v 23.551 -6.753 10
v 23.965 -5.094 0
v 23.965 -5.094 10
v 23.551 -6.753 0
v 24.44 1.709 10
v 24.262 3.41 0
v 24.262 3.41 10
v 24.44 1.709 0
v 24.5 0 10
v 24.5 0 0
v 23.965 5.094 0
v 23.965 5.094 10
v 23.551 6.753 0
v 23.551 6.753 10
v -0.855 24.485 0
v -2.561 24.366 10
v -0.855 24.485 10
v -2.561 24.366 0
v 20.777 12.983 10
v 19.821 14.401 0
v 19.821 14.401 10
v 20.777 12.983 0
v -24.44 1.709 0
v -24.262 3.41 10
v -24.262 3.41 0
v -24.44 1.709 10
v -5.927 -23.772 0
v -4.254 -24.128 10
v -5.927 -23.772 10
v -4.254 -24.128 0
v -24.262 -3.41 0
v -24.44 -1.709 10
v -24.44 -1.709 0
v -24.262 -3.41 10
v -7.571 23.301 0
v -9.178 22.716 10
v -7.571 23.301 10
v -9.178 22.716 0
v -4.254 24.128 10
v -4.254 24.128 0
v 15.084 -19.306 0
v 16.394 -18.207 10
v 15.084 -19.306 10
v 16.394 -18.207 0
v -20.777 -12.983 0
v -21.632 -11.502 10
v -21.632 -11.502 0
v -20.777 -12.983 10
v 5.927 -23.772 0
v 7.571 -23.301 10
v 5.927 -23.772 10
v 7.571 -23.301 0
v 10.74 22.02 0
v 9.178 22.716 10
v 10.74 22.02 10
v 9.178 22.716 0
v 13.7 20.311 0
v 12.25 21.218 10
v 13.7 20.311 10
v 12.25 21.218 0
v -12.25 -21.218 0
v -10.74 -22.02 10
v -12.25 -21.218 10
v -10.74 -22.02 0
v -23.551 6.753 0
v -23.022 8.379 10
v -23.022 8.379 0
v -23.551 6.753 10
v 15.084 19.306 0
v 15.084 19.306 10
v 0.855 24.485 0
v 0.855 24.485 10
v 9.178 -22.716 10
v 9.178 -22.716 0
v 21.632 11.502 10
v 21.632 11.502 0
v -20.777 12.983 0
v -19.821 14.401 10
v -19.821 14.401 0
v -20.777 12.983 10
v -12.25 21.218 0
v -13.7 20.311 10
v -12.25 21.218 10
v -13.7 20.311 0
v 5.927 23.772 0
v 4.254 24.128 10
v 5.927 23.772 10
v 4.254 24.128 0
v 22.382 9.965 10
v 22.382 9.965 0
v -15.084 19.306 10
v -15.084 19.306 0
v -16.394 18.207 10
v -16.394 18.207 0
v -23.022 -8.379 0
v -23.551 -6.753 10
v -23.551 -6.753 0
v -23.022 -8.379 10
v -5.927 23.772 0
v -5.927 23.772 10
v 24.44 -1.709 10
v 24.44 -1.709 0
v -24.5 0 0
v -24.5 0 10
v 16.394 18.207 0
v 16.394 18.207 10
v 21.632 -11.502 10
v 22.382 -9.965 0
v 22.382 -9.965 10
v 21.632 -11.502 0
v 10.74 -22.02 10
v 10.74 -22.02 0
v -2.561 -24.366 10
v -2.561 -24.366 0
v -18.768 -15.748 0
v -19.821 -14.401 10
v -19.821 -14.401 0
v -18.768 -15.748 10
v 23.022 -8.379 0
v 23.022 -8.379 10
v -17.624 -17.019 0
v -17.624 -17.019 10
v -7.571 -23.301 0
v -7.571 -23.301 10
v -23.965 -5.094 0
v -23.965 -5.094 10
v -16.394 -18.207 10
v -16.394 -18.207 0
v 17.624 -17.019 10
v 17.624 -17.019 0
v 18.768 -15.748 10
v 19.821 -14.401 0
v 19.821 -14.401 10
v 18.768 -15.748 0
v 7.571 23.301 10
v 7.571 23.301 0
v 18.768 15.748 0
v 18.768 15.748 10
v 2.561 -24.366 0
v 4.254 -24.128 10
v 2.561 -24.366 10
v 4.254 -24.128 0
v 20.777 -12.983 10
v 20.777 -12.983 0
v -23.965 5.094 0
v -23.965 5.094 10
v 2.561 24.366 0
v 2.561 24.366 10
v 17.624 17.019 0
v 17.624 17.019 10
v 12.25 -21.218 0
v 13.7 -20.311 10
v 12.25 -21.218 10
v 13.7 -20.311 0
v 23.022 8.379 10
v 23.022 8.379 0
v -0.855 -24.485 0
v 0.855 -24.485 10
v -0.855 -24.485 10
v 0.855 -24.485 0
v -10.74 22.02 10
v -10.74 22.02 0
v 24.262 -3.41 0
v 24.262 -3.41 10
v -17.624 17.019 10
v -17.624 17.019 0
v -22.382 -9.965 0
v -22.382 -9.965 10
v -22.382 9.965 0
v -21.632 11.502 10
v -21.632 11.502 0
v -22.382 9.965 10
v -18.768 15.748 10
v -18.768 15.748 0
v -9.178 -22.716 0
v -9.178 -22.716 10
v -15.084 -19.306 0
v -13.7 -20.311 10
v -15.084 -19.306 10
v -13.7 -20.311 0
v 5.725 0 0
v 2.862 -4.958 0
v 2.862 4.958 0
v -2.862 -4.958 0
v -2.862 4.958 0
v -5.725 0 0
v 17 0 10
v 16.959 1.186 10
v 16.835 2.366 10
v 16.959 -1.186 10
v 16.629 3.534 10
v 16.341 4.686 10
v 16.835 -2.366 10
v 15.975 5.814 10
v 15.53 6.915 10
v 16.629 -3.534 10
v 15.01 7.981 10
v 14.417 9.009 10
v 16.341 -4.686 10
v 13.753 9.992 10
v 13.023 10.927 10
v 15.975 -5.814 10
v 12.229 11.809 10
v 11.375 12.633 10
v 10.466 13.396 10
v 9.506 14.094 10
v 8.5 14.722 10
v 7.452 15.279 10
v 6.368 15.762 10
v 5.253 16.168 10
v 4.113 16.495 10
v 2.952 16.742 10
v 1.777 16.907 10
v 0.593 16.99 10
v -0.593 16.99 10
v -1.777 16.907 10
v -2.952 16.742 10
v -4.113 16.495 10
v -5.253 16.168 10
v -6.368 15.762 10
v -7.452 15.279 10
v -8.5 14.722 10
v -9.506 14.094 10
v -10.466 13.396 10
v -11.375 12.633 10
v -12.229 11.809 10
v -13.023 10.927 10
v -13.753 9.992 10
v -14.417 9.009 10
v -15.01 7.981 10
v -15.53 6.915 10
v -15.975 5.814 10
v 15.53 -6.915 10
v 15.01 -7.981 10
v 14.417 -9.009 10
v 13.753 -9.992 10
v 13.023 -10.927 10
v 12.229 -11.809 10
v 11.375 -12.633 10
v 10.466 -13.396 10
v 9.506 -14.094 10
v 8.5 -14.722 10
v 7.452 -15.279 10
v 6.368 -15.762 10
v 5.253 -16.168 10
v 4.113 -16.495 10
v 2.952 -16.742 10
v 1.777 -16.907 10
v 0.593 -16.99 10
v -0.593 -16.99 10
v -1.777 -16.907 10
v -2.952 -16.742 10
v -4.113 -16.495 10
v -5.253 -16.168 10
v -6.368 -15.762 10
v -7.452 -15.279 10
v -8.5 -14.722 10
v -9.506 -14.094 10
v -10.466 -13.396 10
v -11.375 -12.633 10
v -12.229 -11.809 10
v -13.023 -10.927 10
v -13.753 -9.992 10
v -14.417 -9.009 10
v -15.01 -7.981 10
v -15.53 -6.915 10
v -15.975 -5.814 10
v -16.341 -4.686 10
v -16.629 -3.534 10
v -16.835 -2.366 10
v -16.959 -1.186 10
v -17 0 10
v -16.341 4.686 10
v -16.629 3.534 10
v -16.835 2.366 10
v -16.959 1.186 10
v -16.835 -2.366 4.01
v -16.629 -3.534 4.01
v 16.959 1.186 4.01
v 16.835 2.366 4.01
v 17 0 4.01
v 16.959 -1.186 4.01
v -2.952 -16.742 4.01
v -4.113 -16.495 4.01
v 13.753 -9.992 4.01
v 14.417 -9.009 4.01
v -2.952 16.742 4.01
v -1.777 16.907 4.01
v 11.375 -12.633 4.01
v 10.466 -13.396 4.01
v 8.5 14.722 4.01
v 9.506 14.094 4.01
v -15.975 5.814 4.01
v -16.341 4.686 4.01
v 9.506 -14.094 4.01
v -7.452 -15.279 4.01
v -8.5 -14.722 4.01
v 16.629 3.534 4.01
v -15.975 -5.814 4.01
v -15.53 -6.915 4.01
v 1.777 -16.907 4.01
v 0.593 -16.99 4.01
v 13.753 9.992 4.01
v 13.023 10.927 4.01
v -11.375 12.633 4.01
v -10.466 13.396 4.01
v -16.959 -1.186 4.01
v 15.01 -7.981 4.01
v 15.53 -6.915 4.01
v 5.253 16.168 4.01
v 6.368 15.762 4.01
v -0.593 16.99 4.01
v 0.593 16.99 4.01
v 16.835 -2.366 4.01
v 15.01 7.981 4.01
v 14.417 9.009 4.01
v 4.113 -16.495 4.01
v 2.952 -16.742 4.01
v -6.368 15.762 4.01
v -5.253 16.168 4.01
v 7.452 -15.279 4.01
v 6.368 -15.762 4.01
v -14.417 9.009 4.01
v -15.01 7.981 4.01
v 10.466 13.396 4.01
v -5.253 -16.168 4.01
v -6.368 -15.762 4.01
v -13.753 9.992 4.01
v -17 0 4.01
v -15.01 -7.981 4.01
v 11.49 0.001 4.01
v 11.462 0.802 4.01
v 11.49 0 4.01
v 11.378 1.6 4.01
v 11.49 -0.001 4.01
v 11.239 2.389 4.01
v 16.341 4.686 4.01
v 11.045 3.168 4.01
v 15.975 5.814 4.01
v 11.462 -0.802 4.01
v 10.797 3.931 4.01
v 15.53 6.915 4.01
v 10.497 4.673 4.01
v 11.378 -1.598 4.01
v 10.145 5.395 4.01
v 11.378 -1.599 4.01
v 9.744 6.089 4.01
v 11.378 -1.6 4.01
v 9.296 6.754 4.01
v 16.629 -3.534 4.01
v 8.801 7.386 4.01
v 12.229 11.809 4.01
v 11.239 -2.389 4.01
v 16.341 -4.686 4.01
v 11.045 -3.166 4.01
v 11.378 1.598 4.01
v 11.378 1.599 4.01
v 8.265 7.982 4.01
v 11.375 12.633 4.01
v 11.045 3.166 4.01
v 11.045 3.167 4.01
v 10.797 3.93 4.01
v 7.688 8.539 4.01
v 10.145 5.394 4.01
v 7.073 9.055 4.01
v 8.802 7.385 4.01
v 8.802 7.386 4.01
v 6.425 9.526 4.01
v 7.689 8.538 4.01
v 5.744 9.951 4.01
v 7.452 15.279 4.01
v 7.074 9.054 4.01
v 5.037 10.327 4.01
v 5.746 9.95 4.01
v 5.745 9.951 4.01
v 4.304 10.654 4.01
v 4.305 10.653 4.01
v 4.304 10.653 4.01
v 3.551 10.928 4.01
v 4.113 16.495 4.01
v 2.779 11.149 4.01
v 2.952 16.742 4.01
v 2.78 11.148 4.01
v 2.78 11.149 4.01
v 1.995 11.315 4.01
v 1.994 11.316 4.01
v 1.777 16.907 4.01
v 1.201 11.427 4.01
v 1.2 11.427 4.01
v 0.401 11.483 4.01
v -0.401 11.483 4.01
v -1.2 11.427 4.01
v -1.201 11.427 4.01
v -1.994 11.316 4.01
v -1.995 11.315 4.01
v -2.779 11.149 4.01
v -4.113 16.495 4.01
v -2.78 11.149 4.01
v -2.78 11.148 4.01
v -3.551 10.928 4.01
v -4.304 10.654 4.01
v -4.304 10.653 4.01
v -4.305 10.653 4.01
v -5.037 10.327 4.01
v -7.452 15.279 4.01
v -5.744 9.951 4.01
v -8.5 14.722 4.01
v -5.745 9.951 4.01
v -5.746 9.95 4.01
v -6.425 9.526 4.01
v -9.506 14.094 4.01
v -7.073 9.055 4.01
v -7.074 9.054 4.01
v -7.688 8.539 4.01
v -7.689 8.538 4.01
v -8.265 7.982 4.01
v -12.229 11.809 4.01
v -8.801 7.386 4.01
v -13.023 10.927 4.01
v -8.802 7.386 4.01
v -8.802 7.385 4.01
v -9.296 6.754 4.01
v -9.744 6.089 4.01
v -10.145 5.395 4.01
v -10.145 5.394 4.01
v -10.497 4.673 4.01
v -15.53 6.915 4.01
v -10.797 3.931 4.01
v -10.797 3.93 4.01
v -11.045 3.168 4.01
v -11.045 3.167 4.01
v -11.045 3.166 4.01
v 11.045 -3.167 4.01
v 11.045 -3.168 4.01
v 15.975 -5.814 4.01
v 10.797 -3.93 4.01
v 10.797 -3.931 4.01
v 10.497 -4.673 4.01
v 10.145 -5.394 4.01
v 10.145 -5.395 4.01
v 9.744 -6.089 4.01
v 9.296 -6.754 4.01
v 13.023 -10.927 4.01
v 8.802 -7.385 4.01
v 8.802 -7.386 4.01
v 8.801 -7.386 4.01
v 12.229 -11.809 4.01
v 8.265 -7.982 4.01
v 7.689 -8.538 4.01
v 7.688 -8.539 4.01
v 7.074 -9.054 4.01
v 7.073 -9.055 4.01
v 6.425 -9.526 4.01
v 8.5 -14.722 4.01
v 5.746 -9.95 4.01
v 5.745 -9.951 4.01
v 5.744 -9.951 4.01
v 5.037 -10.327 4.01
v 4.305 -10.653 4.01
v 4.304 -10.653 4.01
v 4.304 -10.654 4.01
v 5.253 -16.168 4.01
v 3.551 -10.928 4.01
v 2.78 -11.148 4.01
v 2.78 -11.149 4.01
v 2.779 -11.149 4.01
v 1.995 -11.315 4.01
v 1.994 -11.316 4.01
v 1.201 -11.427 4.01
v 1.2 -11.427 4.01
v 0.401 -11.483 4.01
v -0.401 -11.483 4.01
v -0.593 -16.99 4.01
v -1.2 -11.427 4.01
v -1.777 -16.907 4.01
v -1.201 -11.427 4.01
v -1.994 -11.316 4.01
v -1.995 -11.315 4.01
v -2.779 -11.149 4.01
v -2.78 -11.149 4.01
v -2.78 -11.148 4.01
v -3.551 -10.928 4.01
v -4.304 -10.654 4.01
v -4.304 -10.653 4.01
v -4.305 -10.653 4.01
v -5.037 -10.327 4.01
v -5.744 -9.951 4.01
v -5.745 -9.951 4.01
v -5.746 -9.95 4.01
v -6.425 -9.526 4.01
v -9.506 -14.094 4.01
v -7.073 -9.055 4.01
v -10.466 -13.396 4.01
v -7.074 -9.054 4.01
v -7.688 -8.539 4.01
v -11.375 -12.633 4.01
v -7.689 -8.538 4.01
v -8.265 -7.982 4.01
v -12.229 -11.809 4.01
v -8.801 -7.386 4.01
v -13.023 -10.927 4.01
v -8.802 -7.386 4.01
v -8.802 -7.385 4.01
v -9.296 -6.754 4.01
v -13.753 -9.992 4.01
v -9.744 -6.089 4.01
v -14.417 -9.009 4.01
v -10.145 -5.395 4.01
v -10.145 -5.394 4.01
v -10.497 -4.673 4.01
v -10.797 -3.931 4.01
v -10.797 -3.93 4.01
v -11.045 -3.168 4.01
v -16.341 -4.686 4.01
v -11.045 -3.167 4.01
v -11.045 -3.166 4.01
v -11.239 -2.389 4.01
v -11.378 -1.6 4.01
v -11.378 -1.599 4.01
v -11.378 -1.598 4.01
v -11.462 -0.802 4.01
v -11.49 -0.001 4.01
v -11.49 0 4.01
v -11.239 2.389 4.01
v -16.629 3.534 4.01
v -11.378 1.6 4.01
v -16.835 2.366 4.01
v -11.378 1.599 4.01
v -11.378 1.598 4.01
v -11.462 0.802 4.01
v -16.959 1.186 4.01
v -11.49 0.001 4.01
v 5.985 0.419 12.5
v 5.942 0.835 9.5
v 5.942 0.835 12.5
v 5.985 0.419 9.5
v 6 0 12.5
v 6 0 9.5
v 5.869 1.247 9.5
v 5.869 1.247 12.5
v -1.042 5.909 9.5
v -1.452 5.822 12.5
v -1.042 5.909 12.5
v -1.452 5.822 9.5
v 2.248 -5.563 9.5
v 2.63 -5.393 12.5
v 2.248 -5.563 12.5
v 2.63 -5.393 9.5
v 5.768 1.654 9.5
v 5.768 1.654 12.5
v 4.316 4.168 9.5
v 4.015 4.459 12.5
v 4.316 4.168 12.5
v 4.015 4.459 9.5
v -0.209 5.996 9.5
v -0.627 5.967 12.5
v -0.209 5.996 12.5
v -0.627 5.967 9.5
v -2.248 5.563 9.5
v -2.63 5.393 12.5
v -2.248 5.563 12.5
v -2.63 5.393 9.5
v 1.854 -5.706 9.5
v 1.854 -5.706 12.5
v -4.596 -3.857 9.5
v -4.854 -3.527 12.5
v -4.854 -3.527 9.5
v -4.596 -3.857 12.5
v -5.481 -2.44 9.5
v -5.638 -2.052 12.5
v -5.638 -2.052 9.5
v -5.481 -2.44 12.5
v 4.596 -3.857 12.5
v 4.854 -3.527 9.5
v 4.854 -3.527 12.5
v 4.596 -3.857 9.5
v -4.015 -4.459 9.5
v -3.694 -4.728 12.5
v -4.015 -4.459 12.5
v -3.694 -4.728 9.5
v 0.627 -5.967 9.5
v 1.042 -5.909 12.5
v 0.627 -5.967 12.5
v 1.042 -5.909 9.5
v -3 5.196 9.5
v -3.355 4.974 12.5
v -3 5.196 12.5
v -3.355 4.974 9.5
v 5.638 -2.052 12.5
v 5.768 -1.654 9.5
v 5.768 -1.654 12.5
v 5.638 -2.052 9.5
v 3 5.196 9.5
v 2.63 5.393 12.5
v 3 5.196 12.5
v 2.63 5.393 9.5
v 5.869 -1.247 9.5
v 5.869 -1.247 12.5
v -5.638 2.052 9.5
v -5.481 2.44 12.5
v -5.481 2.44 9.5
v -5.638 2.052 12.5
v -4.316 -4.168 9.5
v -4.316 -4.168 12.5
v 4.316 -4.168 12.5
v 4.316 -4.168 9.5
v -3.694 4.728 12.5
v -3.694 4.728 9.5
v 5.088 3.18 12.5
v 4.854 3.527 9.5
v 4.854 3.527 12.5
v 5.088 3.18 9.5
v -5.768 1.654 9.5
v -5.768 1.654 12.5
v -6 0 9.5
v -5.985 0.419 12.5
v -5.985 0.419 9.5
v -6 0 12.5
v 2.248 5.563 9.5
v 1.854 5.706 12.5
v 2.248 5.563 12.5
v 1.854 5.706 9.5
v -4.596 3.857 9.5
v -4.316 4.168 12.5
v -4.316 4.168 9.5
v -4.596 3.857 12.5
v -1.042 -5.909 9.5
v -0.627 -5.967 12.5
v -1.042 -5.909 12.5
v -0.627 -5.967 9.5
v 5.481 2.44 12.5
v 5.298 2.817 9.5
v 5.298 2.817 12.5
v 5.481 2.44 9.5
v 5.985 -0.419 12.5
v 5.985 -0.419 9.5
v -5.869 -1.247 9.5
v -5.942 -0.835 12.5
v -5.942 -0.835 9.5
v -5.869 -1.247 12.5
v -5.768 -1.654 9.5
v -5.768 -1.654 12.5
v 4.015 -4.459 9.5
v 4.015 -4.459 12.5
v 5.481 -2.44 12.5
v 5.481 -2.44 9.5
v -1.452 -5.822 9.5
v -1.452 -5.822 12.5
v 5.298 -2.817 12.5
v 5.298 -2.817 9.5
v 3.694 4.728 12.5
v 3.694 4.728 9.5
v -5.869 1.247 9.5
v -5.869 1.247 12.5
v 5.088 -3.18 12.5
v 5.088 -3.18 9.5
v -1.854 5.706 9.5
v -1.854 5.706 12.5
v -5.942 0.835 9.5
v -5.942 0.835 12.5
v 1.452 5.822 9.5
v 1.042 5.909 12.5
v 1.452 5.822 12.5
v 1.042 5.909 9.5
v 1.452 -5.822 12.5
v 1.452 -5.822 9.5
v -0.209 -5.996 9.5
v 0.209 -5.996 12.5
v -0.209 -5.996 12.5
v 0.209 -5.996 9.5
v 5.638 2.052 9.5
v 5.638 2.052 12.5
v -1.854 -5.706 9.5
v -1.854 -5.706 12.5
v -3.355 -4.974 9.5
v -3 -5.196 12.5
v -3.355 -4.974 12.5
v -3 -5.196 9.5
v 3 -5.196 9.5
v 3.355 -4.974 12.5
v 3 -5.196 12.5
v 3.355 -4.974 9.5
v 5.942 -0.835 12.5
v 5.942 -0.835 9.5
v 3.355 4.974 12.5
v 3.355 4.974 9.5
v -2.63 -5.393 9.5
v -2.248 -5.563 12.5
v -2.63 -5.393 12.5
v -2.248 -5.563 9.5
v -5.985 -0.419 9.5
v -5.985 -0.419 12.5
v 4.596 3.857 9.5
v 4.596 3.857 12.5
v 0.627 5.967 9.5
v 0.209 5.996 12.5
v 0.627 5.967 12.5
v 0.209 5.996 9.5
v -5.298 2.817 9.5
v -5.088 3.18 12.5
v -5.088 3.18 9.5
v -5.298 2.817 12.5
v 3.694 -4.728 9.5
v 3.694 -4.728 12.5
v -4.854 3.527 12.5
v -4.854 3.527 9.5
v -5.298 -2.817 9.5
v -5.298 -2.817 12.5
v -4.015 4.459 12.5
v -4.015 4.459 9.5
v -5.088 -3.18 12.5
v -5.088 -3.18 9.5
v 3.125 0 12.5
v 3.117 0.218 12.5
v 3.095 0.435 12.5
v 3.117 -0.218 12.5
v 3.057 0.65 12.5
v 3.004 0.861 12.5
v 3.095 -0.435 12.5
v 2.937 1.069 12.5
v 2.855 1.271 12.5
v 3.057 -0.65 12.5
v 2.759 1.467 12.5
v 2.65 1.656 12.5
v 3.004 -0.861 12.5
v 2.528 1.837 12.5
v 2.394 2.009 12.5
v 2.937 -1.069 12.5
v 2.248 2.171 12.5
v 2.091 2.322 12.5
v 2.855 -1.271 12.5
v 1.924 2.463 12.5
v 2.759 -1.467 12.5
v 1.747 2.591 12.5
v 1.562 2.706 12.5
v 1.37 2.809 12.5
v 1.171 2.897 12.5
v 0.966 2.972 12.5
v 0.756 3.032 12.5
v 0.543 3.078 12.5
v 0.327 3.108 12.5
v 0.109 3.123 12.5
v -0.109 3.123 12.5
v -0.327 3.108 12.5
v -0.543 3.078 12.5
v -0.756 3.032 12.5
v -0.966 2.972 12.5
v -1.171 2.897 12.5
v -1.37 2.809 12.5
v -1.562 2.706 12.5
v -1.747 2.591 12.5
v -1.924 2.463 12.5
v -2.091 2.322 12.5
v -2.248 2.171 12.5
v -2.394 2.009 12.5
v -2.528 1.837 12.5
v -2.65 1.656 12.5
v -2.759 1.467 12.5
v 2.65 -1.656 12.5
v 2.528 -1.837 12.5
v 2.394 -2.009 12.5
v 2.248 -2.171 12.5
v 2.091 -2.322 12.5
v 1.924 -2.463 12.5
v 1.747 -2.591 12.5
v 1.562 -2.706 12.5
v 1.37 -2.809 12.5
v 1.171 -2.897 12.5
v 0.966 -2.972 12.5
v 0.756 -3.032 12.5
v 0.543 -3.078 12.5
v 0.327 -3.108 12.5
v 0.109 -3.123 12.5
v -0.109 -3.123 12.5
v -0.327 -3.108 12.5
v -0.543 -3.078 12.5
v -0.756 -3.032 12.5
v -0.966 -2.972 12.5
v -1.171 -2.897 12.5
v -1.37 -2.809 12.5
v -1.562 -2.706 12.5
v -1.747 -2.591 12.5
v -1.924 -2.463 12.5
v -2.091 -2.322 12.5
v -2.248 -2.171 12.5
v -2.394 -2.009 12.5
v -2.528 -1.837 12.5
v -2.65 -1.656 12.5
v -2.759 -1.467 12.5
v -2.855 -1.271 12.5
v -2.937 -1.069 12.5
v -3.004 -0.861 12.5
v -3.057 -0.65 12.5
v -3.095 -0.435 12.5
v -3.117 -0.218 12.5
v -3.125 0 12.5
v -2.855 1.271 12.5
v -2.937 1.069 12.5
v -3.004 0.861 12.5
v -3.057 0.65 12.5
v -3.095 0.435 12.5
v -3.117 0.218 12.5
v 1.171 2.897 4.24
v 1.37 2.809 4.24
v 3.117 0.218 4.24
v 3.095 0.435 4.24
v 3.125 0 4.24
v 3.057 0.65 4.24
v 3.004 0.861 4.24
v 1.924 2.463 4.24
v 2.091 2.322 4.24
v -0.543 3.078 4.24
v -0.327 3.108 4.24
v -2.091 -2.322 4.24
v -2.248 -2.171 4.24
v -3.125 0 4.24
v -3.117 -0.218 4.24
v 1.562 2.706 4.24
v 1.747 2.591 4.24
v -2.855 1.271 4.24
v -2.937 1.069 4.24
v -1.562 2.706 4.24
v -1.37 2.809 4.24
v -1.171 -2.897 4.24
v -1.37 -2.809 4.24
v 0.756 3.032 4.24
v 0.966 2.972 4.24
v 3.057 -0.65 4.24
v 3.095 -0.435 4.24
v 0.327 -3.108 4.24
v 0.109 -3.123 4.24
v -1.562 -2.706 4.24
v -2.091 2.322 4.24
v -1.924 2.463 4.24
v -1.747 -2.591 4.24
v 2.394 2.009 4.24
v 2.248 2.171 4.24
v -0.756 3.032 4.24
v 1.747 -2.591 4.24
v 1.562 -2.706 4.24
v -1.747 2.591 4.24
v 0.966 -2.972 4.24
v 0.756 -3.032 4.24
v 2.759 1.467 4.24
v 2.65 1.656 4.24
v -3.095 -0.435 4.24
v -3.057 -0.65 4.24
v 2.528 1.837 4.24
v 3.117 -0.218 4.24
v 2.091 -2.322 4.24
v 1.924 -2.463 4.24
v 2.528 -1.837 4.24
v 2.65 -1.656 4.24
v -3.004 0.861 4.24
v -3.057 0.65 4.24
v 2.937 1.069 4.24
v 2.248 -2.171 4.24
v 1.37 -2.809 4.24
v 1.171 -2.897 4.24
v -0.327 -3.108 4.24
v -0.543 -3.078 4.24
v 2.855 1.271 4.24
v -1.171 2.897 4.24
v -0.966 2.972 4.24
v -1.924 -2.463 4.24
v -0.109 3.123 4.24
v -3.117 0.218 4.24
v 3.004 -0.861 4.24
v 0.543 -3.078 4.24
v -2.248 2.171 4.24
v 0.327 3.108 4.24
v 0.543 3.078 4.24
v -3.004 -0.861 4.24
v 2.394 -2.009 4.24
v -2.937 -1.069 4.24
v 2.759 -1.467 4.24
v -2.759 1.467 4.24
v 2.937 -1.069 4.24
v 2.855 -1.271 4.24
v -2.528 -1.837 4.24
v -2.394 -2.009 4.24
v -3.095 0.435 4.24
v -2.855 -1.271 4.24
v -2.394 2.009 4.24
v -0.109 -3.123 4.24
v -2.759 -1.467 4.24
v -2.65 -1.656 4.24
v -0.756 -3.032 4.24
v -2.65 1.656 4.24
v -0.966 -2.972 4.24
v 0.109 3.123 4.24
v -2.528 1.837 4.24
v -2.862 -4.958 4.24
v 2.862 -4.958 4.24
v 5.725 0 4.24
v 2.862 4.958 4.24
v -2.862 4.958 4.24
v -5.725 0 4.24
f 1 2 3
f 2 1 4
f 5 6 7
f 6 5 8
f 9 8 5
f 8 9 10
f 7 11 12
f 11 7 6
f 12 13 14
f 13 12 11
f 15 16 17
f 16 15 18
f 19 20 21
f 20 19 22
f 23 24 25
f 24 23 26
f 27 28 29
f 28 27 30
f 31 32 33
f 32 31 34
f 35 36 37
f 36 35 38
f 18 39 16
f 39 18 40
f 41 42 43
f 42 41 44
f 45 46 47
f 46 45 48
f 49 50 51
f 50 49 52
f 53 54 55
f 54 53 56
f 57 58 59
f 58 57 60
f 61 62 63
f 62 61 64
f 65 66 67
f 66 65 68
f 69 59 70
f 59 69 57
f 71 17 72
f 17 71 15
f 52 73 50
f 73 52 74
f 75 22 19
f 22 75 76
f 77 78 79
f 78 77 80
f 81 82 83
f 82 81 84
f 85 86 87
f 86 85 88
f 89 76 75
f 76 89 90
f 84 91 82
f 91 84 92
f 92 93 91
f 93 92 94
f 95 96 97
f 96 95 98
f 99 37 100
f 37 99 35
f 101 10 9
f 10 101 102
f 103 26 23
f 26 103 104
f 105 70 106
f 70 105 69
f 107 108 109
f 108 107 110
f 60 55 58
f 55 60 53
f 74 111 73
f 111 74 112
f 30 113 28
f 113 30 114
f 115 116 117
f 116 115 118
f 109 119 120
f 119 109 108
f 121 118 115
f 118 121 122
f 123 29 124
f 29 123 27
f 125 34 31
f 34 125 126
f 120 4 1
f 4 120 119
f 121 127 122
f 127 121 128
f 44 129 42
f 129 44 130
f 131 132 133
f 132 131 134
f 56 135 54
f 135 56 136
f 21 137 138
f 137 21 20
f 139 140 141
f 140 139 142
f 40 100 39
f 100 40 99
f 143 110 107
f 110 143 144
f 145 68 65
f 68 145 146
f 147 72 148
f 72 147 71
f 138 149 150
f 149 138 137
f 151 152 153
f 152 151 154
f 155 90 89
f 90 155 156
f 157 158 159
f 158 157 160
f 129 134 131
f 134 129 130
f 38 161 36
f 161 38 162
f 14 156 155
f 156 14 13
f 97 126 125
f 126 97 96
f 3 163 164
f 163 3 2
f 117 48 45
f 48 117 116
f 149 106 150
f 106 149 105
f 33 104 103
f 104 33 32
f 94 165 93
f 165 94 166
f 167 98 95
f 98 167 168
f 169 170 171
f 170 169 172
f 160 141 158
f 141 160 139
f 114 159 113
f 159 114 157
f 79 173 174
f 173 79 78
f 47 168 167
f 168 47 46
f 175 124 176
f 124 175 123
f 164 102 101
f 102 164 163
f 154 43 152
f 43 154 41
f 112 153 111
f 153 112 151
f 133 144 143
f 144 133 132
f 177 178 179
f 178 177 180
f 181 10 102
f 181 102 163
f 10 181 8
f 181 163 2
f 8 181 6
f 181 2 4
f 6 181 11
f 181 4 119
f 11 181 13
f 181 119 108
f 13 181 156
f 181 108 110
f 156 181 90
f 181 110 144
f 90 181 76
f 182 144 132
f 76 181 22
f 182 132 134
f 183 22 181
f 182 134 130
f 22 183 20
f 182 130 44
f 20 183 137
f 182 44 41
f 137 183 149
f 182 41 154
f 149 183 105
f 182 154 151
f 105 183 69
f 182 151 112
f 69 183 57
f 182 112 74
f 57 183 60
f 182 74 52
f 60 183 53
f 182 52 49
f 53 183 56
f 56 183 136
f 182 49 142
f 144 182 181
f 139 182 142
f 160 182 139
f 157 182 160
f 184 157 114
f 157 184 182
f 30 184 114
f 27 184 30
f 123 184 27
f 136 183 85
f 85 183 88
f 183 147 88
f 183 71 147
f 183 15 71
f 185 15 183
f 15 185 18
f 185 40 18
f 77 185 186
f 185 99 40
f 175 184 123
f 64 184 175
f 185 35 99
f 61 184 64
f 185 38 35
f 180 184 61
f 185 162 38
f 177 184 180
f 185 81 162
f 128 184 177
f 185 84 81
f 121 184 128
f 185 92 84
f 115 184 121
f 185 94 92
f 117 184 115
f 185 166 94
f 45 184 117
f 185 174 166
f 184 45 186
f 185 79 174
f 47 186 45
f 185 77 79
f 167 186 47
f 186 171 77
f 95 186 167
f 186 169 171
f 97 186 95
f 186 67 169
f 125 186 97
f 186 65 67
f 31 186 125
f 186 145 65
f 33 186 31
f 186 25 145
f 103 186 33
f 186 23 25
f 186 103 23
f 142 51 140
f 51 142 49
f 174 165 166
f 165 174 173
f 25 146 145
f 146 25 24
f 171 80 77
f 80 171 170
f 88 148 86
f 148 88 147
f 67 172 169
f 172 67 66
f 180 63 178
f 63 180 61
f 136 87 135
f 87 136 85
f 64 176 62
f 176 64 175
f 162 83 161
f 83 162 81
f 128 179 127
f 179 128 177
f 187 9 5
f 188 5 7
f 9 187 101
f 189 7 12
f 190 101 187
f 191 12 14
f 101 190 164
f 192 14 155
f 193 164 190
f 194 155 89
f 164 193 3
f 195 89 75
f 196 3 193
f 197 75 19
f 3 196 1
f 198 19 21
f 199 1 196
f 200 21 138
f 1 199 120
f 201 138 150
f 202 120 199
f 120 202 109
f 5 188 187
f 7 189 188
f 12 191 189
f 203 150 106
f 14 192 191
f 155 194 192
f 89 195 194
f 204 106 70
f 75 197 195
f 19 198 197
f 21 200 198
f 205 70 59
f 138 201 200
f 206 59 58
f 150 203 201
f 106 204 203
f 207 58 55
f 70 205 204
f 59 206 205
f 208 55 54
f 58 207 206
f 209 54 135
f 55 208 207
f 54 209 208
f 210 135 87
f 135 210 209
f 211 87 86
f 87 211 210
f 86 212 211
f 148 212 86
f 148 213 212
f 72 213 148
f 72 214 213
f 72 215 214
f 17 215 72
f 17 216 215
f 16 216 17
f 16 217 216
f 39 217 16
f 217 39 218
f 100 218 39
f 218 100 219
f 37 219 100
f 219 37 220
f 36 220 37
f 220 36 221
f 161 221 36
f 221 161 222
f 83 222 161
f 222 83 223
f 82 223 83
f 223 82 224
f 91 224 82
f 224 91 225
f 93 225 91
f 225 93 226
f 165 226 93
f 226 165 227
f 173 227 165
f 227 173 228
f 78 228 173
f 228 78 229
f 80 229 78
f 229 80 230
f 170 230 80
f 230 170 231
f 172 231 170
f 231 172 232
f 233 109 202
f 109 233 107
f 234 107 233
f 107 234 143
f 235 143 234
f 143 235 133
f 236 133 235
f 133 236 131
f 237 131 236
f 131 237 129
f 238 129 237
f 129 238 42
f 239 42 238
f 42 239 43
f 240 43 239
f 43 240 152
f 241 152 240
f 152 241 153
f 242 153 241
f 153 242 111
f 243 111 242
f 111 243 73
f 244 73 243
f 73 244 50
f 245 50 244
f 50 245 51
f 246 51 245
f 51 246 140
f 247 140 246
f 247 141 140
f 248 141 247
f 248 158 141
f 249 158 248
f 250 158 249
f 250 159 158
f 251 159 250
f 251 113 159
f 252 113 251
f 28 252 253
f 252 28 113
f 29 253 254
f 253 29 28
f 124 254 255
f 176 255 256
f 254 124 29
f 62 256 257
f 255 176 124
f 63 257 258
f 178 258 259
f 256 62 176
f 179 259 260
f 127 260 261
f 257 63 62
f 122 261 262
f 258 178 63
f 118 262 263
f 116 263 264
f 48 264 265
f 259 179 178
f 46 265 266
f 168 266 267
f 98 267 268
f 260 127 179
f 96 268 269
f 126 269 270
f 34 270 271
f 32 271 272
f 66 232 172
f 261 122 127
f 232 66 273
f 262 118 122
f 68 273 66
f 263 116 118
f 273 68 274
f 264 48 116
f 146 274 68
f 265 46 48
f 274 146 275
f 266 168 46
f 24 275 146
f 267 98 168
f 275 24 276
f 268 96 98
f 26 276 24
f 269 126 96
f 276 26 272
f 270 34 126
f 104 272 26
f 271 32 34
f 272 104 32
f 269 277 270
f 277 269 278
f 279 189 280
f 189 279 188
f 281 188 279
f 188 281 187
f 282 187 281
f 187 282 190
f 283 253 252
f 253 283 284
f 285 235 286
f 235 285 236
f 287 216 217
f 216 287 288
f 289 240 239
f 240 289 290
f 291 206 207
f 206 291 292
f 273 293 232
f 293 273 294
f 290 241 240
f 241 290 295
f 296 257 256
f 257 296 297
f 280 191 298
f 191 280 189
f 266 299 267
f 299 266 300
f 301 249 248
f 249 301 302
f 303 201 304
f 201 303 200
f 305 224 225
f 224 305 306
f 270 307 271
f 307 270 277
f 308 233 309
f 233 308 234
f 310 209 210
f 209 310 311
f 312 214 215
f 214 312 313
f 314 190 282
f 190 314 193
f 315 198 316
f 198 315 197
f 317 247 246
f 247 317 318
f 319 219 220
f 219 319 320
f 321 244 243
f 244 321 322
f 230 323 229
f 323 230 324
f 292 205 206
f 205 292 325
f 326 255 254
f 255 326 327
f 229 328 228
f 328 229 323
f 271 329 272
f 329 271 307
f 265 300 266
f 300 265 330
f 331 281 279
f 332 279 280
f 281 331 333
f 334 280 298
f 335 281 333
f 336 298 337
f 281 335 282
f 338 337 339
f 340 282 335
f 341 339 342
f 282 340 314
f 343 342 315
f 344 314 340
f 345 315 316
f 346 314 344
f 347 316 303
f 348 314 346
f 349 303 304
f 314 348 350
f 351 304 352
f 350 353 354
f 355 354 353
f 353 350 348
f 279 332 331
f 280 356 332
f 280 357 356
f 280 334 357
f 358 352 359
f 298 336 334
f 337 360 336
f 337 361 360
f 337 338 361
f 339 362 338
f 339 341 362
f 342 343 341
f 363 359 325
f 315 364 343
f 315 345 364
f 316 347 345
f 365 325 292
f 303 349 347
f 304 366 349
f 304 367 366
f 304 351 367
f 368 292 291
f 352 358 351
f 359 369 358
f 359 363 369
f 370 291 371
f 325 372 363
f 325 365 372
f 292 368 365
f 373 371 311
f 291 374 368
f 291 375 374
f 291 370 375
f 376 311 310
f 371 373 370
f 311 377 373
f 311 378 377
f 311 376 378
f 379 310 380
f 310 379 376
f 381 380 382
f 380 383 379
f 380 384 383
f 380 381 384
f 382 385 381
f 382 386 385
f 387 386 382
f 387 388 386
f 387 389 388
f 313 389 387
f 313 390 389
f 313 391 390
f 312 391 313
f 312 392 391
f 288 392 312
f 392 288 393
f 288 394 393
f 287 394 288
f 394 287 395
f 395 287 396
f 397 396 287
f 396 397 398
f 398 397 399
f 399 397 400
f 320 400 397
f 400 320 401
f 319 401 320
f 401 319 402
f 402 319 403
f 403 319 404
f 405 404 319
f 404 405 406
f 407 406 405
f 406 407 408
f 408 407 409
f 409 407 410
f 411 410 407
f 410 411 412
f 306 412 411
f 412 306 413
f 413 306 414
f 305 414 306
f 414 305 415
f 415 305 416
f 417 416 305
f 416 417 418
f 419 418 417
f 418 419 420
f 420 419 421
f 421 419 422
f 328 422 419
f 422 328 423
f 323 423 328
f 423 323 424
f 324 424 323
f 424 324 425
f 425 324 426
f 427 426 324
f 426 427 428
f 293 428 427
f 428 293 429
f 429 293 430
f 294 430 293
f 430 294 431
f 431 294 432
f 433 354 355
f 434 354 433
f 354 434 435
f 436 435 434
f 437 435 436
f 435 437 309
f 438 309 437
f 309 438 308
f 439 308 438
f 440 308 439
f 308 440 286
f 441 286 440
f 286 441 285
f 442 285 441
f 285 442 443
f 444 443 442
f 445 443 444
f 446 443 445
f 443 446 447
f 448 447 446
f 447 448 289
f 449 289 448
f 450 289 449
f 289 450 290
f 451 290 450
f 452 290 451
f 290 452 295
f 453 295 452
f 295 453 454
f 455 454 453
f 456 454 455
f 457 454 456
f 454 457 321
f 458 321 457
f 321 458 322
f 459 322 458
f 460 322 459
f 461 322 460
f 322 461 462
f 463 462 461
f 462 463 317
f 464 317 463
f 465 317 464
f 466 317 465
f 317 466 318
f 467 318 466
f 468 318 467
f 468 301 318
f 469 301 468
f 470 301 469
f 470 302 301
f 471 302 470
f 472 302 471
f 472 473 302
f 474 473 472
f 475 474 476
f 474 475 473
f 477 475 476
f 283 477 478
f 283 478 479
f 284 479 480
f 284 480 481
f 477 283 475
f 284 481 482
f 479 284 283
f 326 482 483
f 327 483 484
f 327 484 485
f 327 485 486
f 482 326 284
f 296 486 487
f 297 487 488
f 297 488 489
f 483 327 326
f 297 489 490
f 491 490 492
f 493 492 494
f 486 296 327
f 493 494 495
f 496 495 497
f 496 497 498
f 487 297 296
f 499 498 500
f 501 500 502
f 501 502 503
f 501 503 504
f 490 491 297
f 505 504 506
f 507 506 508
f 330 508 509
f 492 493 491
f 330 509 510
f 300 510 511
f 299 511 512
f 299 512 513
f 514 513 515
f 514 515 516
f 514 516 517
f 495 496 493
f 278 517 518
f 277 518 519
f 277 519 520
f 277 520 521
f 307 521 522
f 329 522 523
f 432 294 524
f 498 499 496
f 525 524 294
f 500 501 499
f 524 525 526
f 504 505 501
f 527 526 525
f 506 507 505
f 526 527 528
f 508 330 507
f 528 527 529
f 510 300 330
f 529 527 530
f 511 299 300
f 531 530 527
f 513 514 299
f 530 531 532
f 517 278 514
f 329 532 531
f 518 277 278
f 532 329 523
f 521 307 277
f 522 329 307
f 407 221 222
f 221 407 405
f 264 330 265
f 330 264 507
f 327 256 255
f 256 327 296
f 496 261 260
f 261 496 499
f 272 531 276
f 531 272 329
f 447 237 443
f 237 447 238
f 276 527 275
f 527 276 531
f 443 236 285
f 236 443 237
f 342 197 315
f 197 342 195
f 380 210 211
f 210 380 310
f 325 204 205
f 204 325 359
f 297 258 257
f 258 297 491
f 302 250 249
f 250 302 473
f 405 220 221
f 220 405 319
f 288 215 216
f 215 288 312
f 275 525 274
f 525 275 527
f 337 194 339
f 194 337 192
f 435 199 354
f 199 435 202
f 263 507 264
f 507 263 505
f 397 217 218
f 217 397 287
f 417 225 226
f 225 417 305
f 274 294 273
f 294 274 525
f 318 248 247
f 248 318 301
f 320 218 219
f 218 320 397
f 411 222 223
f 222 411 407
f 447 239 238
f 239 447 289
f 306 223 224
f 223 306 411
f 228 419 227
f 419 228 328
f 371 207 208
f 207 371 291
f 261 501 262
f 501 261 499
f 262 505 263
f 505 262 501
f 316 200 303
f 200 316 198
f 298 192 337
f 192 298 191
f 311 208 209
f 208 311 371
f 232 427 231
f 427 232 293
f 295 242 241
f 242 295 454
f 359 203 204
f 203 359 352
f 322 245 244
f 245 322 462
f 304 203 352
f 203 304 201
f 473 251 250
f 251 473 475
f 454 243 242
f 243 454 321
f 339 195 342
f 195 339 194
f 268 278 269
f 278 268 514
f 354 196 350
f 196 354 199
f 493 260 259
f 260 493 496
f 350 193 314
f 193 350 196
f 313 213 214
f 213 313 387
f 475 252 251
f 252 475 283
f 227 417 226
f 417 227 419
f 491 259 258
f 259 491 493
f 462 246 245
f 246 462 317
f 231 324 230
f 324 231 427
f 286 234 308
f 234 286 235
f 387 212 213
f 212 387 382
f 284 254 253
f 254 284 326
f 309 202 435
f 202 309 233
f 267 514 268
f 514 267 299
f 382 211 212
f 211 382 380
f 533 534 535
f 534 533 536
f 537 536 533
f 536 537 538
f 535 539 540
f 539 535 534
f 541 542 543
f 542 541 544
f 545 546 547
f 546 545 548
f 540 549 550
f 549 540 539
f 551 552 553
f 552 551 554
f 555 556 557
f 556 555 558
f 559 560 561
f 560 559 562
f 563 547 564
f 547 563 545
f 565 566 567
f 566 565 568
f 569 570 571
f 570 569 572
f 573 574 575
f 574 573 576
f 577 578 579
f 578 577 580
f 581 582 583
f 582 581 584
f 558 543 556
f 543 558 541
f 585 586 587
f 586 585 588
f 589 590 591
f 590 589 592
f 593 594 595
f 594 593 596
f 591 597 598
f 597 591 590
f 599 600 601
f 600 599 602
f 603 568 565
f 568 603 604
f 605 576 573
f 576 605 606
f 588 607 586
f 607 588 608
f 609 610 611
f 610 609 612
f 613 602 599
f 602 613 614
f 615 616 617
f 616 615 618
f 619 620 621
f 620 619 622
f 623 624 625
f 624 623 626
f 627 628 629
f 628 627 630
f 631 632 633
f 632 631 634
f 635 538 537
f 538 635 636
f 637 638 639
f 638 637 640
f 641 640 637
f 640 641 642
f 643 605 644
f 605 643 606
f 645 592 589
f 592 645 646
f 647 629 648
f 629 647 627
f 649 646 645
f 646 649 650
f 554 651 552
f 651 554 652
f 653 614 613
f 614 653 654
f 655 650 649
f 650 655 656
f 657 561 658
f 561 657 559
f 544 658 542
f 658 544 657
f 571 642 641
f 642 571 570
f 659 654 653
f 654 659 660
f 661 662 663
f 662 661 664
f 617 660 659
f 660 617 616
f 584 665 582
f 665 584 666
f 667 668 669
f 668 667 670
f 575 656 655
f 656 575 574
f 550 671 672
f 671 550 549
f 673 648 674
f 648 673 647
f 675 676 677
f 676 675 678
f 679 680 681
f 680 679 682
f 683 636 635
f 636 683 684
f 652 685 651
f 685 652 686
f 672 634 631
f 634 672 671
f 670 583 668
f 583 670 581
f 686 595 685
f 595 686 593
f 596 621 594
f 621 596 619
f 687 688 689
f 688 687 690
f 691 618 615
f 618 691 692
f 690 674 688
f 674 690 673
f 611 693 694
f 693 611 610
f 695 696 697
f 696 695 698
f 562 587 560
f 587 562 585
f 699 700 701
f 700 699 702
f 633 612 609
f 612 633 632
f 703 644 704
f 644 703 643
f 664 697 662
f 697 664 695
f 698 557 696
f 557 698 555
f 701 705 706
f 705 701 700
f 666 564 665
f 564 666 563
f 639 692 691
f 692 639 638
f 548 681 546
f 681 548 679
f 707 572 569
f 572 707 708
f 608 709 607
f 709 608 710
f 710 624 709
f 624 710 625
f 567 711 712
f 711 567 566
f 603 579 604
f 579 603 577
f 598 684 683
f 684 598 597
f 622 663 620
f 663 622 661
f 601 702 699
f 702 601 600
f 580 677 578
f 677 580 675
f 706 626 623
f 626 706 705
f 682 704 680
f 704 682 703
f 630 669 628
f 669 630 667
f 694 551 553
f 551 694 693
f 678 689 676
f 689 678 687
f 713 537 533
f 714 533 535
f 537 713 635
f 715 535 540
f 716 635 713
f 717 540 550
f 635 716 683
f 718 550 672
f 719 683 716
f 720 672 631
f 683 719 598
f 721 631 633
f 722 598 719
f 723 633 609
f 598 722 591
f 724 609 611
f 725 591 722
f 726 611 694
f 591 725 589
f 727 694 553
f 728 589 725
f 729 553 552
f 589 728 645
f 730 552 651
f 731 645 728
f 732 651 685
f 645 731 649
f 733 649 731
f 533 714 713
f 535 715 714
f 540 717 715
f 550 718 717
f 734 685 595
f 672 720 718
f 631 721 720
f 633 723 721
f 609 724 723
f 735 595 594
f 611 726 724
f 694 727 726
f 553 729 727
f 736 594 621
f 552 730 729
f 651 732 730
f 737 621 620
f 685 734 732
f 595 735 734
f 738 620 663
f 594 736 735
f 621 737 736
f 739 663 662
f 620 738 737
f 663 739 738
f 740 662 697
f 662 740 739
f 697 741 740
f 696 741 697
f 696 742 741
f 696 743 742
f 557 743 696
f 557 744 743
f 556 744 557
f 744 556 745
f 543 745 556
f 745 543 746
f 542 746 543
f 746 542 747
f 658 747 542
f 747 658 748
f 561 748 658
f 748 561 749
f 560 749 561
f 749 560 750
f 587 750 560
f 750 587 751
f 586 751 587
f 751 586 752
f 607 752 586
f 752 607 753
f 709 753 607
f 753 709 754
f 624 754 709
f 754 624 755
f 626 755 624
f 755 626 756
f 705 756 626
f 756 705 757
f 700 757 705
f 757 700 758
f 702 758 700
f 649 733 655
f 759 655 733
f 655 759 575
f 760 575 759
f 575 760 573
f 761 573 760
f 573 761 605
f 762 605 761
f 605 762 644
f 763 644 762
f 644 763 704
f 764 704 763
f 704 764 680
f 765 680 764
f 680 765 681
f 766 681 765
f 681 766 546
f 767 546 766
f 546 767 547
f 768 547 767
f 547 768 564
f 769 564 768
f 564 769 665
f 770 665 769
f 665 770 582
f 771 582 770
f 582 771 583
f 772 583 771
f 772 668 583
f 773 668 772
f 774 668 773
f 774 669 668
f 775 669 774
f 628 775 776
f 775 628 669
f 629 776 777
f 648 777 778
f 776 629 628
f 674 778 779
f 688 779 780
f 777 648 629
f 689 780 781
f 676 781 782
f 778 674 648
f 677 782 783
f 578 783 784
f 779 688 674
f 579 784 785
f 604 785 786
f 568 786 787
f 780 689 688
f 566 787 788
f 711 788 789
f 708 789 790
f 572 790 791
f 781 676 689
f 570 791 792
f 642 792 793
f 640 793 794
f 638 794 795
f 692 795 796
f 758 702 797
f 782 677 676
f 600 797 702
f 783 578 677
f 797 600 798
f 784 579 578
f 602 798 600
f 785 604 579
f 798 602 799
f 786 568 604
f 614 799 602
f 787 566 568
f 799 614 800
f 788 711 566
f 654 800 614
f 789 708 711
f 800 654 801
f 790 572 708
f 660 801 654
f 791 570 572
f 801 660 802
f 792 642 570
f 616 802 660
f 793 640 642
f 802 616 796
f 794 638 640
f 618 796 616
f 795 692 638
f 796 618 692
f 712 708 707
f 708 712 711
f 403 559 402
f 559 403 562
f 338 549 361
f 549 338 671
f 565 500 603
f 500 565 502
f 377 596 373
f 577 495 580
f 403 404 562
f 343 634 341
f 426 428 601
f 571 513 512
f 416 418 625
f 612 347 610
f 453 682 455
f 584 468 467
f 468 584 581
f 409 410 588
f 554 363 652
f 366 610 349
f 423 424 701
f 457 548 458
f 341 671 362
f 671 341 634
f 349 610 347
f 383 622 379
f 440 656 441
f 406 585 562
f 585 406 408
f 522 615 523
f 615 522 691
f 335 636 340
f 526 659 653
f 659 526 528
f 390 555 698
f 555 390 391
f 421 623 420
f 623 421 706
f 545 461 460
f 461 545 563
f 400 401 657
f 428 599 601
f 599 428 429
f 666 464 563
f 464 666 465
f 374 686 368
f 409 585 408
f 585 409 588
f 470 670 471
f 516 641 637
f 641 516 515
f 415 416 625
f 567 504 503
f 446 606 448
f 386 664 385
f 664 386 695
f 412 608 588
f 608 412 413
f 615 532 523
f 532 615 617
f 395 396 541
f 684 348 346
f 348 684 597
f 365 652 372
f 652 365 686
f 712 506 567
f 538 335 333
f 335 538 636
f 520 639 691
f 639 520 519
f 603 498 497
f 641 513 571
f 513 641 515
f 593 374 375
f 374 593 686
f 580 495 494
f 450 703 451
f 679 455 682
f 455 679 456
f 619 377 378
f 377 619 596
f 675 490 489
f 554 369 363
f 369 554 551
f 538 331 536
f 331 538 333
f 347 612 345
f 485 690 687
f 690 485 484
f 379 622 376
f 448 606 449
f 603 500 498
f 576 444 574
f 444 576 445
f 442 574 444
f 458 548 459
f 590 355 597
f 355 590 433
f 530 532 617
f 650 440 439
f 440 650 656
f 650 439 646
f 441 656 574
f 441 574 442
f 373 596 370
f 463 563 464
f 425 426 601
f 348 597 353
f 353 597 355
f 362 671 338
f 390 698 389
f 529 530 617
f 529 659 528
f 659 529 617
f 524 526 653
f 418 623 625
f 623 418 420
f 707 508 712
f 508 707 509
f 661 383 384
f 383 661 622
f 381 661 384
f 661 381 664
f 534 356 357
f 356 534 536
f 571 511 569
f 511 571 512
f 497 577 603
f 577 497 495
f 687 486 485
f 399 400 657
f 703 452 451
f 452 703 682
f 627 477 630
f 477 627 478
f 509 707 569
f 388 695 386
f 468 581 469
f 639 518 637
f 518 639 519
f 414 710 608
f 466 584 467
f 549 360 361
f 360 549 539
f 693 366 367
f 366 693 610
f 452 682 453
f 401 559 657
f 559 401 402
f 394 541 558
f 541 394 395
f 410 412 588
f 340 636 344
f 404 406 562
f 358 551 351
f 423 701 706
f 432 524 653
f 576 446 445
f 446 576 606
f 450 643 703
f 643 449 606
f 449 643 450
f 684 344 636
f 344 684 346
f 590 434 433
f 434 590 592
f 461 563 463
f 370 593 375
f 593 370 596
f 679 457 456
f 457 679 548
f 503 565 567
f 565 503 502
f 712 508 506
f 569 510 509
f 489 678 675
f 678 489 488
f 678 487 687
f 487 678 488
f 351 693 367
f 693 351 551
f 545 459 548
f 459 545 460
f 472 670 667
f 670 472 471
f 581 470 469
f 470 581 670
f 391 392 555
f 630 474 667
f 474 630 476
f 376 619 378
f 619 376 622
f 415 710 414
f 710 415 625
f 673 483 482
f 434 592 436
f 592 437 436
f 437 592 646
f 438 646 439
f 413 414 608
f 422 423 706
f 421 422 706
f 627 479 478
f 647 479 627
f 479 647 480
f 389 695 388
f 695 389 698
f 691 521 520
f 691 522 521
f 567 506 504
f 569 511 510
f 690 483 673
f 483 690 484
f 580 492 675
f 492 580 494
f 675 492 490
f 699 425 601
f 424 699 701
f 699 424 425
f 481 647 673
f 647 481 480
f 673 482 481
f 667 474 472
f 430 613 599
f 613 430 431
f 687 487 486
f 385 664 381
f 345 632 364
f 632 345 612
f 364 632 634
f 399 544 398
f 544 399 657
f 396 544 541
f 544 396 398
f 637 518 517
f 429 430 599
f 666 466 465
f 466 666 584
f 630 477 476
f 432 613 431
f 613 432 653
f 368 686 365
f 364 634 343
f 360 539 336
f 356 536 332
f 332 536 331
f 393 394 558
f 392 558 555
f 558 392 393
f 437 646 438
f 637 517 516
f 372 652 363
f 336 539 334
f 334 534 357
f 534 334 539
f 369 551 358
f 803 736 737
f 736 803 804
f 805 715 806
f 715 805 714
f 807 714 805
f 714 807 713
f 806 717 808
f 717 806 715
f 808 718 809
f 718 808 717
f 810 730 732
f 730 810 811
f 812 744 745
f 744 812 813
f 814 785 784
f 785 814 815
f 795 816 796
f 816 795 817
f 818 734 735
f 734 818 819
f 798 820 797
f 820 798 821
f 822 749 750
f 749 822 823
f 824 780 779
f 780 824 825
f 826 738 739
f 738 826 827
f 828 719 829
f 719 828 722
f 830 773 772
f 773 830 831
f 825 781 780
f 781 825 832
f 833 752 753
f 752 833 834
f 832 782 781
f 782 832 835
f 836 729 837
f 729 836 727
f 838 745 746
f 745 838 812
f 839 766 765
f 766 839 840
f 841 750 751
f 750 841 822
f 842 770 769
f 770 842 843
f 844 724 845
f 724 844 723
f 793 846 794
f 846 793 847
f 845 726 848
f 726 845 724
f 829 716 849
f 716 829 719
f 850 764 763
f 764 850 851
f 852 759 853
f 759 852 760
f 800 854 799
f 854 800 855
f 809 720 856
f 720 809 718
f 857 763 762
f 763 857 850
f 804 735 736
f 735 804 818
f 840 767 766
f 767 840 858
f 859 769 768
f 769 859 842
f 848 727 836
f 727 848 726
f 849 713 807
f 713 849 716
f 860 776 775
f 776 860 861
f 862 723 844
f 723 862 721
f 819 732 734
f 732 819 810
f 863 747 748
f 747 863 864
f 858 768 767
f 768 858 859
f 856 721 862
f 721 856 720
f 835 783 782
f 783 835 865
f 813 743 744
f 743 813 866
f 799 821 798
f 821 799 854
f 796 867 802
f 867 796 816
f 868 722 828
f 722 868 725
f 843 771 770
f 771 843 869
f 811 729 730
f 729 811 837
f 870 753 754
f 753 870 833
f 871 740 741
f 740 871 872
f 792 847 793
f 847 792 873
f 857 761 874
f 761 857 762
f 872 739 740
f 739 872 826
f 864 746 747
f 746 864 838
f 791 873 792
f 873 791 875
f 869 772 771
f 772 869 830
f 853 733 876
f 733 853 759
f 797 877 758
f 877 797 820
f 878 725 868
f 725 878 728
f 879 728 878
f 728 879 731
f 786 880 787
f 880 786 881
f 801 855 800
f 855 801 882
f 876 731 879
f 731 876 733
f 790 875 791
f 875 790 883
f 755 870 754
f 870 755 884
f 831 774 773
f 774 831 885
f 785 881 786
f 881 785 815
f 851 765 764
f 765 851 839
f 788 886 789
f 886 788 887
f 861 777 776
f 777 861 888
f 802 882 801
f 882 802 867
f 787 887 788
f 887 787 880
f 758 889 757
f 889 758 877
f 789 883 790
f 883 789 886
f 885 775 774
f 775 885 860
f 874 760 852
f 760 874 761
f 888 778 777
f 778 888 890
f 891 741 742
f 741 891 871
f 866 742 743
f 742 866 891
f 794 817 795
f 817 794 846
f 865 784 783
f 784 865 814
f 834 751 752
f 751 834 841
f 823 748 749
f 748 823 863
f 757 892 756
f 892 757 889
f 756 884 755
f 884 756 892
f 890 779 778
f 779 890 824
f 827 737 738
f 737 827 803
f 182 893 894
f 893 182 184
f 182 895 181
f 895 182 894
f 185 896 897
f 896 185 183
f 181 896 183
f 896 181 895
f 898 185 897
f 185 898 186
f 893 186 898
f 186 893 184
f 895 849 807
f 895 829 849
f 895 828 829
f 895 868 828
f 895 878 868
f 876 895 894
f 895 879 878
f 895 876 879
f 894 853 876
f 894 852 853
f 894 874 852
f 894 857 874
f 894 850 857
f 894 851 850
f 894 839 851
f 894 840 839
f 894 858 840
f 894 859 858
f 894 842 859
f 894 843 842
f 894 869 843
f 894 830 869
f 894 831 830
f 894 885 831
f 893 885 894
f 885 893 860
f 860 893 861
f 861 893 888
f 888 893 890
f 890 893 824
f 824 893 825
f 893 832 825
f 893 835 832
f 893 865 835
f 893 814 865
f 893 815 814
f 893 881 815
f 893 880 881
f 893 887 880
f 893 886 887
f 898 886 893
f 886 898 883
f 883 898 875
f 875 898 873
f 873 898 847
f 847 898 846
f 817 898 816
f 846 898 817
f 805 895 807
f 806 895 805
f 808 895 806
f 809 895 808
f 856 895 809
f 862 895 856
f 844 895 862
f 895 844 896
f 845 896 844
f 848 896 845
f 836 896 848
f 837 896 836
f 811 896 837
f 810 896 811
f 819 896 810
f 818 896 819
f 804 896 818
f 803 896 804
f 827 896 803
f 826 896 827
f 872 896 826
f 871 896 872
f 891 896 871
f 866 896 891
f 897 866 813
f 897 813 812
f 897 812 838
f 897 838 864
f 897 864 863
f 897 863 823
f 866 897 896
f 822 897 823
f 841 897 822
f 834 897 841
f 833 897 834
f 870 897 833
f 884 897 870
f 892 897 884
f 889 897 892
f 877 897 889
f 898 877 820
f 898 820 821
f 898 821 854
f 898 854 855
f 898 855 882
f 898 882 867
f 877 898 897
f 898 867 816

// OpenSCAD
$fn = 90;
eps = 0.01;
tol = 0.25;

// wheel parameters
// '-> wheel diameters
w_d = 49;
// '-> wheel thickness
w_h = 10;
// '-> wheel inner hole diameter
w_id = w_d-2*7.5;
// '-> wheel inner hole depth
w_ih = 6;
// '-> wheel dome width
w_dh = 5;
// '-> inner axis height/length
w_ah = 2.5;
// '-> inner axis diameter
w_ad = 12;

// M6 parameters
// '-> diameter
m6_d = 6;
// '-> head thickness
m6_ht = 4;
// '-> head diameter
m6_hd = 11.2;
// '-> nut thickness
m6_nt = 8;
// '-> nut diameter
m6_nd = 11.2;

module wheel()
{
    // main cylinder
    difference()
    {
        // main geometry
        cylinder(d=w_d, h=w_h);
        // drilling hole
        translate([0,0,w_h-w_ih+eps])
            cylinder(d=w_id, h=w_ih);
    }
    
    // adding central axis
    translate([0,0,w_h-w_ih])
        cylinder(h=w_ah+w_ih,d=w_ad);
    
    // adding reinforcement
    translate([0,0,w_h-w_ih])
    hull()
    {
        // lower plate
        translate([0,0,-eps])
            cylinder(h=eps,d=(w_id-w_ad)/2+w_ad);
        cylinder(h=w_ih/2+w_ah,d=w_ad);
    } 
    
}

module right_wheel()
{
    difference()
    {
        // wheel body
        wheel();
        // hole for the bolt body
        translate([0,0,-eps])
            cylinder(d=m6_d+tol, h=w_h+w_ah+2*eps);
        // hole for the bolt head/nut
        translate([0,0,-eps])
            cylinder(d=m6_nd+tol, h=w_h-w_ih+tol, $fn=6);
    }
}

right_wheel();
